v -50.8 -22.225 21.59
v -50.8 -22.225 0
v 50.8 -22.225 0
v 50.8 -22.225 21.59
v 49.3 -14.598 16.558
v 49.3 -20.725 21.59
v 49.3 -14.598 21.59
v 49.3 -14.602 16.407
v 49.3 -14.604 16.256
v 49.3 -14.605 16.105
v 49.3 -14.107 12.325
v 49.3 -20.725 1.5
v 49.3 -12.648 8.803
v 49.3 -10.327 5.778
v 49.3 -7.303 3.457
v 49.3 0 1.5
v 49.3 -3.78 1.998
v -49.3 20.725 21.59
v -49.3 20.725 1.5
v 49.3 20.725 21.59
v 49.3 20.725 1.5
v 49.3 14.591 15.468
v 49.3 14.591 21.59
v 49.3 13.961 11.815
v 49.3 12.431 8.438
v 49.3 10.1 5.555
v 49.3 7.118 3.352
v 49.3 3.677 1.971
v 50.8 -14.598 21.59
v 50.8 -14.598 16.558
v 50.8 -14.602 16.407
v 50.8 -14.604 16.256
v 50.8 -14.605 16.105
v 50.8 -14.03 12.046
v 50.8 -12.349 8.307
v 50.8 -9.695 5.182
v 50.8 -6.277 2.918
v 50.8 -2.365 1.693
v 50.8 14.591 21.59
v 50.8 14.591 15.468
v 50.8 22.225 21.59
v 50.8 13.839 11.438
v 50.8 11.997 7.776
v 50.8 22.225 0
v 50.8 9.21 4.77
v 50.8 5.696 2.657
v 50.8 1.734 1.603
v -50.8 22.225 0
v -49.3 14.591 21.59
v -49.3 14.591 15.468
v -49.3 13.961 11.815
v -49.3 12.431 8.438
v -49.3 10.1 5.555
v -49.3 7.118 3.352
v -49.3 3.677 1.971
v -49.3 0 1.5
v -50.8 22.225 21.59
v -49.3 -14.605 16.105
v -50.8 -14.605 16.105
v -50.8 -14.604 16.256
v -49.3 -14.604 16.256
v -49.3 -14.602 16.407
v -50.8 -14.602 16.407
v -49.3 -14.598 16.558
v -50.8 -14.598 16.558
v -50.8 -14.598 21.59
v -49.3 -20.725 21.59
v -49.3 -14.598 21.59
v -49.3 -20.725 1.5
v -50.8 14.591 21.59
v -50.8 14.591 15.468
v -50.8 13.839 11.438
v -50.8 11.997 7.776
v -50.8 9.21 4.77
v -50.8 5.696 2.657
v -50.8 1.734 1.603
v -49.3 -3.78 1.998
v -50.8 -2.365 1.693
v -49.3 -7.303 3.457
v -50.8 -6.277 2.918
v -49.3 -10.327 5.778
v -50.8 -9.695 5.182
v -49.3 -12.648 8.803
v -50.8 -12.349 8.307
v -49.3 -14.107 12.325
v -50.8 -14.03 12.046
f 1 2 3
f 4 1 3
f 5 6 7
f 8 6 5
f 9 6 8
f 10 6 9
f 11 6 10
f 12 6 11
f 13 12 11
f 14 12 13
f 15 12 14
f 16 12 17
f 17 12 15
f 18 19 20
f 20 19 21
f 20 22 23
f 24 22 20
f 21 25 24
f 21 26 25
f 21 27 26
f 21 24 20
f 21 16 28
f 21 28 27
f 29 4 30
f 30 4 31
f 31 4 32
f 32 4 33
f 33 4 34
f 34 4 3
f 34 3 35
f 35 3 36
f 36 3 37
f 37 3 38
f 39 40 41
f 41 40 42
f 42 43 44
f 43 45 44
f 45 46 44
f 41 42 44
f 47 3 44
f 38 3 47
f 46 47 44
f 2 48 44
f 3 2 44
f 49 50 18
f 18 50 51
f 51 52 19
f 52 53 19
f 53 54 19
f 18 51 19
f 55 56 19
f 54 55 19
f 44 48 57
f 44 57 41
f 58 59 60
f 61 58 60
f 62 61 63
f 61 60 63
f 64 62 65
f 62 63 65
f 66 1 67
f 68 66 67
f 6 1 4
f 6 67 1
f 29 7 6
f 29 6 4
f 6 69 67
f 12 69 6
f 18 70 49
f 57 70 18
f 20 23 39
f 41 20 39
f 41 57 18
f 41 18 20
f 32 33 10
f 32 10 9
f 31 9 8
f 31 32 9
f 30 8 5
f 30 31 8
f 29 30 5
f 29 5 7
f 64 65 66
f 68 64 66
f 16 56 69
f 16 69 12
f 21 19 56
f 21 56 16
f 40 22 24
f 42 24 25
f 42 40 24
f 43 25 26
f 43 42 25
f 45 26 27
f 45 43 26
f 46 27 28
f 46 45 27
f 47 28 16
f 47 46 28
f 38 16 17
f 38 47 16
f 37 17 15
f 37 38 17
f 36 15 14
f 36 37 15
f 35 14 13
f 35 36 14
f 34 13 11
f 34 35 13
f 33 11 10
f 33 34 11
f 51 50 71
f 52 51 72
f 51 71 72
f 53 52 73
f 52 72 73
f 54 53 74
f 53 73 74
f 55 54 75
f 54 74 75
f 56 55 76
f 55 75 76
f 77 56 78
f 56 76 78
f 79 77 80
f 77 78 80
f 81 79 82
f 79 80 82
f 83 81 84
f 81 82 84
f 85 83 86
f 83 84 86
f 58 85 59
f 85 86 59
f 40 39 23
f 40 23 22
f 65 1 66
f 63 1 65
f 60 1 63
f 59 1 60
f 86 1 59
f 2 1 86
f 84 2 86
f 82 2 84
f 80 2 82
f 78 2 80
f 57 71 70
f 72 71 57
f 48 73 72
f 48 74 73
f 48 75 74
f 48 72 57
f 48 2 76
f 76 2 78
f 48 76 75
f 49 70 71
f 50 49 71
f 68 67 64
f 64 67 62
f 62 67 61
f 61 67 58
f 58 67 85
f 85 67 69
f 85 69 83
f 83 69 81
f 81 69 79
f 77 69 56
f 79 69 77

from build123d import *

# Parameters (mm, degrees)
F0_W     = 101.6
F0_H     = 44.45
F1_DEPTH = 21.59
F2_T     = -1.5
F4_DEPTH = 1.5


# Not quite as in the source:
# - a pattern or mirror of a feature is missing from the dataset's text; its kind, count and spacing are read off the source's solid


with BuildPart() as f1:
    # F0 (on Top) → F1 (new body)
    with BuildSketch(Plane.XY):
        Rectangle(F0_W, F0_H)
    extrude(amount=F1_DEPTH)

    # F2
    f2_openings = [f1.faces().sort_by_distance(p)[0] for p in [
        (0, 0, 21.59),
    ]]
    offset(amount=F2_T, openings=f2_openings)

    # F3 (on face) → F4 (cut)
    with BuildSketch(Plane(origin=(-50.8, 0, 0), x_dir=(0, -1, 0), z_dir=(-1, 0, 0))):
        with BuildLine():
            ThreePointArc((-14.5911212754, 15.4684429111), (0.3183541842, 1.5034700934), (14.605, 16.105))
            ThreePointArc((14.605, 16.105), (14.6032460444, 16.3313403807), (14.5979845987, 16.5576263976))
            ThreePointArc((14.5979845987, 16.5576263976), (14.290212434, 19.1209332868), (13.5359078011, 21.59))
            Line((13.5359078011, 21.59), (-13.5359078011, 21.59))
            ThreePointArc((-13.5359078011, 21.59), (-14.2709246664, 19.2109192145), (-14.5911212754, 16.7415570889))
            Line((-14.5911212754, 16.7415570889), (-14.5911212754, 15.4684429111))
        make_face()
        with BuildLine():
            ThreePointArc((13.5359078011, 21.59), (14.290212434, 19.1209332868), (14.5979845987, 16.5576263976))
            Line((14.5979845987, 16.5576263976), (14.5979845987, 21.59))
            Line((14.5979845987, 21.59), (13.5359078011, 21.59))
        make_face()
        with BuildLine():
            Line((-14.5911212754, 21.59), (-14.5911212754, 16.7415570889))
            ThreePointArc((-14.5911212754, 16.7415570889), (-14.2709246664, 19.2109192145), (-13.5359078011, 21.59))
            Line((-13.5359078011, 21.59), (-14.5911212754, 21.59))
        make_face()
    f4 = extrude(amount=-F4_DEPTH, mode=Mode.SUBTRACT)

    # F4_copies: F4 across plane
    add(f4.mirror(Plane(origin=(0, 0, 0), x_dir=(0, 0, 1), z_dir=(1, 0, 0))), mode=Mode.SUBTRACT)


solid = f1.part
